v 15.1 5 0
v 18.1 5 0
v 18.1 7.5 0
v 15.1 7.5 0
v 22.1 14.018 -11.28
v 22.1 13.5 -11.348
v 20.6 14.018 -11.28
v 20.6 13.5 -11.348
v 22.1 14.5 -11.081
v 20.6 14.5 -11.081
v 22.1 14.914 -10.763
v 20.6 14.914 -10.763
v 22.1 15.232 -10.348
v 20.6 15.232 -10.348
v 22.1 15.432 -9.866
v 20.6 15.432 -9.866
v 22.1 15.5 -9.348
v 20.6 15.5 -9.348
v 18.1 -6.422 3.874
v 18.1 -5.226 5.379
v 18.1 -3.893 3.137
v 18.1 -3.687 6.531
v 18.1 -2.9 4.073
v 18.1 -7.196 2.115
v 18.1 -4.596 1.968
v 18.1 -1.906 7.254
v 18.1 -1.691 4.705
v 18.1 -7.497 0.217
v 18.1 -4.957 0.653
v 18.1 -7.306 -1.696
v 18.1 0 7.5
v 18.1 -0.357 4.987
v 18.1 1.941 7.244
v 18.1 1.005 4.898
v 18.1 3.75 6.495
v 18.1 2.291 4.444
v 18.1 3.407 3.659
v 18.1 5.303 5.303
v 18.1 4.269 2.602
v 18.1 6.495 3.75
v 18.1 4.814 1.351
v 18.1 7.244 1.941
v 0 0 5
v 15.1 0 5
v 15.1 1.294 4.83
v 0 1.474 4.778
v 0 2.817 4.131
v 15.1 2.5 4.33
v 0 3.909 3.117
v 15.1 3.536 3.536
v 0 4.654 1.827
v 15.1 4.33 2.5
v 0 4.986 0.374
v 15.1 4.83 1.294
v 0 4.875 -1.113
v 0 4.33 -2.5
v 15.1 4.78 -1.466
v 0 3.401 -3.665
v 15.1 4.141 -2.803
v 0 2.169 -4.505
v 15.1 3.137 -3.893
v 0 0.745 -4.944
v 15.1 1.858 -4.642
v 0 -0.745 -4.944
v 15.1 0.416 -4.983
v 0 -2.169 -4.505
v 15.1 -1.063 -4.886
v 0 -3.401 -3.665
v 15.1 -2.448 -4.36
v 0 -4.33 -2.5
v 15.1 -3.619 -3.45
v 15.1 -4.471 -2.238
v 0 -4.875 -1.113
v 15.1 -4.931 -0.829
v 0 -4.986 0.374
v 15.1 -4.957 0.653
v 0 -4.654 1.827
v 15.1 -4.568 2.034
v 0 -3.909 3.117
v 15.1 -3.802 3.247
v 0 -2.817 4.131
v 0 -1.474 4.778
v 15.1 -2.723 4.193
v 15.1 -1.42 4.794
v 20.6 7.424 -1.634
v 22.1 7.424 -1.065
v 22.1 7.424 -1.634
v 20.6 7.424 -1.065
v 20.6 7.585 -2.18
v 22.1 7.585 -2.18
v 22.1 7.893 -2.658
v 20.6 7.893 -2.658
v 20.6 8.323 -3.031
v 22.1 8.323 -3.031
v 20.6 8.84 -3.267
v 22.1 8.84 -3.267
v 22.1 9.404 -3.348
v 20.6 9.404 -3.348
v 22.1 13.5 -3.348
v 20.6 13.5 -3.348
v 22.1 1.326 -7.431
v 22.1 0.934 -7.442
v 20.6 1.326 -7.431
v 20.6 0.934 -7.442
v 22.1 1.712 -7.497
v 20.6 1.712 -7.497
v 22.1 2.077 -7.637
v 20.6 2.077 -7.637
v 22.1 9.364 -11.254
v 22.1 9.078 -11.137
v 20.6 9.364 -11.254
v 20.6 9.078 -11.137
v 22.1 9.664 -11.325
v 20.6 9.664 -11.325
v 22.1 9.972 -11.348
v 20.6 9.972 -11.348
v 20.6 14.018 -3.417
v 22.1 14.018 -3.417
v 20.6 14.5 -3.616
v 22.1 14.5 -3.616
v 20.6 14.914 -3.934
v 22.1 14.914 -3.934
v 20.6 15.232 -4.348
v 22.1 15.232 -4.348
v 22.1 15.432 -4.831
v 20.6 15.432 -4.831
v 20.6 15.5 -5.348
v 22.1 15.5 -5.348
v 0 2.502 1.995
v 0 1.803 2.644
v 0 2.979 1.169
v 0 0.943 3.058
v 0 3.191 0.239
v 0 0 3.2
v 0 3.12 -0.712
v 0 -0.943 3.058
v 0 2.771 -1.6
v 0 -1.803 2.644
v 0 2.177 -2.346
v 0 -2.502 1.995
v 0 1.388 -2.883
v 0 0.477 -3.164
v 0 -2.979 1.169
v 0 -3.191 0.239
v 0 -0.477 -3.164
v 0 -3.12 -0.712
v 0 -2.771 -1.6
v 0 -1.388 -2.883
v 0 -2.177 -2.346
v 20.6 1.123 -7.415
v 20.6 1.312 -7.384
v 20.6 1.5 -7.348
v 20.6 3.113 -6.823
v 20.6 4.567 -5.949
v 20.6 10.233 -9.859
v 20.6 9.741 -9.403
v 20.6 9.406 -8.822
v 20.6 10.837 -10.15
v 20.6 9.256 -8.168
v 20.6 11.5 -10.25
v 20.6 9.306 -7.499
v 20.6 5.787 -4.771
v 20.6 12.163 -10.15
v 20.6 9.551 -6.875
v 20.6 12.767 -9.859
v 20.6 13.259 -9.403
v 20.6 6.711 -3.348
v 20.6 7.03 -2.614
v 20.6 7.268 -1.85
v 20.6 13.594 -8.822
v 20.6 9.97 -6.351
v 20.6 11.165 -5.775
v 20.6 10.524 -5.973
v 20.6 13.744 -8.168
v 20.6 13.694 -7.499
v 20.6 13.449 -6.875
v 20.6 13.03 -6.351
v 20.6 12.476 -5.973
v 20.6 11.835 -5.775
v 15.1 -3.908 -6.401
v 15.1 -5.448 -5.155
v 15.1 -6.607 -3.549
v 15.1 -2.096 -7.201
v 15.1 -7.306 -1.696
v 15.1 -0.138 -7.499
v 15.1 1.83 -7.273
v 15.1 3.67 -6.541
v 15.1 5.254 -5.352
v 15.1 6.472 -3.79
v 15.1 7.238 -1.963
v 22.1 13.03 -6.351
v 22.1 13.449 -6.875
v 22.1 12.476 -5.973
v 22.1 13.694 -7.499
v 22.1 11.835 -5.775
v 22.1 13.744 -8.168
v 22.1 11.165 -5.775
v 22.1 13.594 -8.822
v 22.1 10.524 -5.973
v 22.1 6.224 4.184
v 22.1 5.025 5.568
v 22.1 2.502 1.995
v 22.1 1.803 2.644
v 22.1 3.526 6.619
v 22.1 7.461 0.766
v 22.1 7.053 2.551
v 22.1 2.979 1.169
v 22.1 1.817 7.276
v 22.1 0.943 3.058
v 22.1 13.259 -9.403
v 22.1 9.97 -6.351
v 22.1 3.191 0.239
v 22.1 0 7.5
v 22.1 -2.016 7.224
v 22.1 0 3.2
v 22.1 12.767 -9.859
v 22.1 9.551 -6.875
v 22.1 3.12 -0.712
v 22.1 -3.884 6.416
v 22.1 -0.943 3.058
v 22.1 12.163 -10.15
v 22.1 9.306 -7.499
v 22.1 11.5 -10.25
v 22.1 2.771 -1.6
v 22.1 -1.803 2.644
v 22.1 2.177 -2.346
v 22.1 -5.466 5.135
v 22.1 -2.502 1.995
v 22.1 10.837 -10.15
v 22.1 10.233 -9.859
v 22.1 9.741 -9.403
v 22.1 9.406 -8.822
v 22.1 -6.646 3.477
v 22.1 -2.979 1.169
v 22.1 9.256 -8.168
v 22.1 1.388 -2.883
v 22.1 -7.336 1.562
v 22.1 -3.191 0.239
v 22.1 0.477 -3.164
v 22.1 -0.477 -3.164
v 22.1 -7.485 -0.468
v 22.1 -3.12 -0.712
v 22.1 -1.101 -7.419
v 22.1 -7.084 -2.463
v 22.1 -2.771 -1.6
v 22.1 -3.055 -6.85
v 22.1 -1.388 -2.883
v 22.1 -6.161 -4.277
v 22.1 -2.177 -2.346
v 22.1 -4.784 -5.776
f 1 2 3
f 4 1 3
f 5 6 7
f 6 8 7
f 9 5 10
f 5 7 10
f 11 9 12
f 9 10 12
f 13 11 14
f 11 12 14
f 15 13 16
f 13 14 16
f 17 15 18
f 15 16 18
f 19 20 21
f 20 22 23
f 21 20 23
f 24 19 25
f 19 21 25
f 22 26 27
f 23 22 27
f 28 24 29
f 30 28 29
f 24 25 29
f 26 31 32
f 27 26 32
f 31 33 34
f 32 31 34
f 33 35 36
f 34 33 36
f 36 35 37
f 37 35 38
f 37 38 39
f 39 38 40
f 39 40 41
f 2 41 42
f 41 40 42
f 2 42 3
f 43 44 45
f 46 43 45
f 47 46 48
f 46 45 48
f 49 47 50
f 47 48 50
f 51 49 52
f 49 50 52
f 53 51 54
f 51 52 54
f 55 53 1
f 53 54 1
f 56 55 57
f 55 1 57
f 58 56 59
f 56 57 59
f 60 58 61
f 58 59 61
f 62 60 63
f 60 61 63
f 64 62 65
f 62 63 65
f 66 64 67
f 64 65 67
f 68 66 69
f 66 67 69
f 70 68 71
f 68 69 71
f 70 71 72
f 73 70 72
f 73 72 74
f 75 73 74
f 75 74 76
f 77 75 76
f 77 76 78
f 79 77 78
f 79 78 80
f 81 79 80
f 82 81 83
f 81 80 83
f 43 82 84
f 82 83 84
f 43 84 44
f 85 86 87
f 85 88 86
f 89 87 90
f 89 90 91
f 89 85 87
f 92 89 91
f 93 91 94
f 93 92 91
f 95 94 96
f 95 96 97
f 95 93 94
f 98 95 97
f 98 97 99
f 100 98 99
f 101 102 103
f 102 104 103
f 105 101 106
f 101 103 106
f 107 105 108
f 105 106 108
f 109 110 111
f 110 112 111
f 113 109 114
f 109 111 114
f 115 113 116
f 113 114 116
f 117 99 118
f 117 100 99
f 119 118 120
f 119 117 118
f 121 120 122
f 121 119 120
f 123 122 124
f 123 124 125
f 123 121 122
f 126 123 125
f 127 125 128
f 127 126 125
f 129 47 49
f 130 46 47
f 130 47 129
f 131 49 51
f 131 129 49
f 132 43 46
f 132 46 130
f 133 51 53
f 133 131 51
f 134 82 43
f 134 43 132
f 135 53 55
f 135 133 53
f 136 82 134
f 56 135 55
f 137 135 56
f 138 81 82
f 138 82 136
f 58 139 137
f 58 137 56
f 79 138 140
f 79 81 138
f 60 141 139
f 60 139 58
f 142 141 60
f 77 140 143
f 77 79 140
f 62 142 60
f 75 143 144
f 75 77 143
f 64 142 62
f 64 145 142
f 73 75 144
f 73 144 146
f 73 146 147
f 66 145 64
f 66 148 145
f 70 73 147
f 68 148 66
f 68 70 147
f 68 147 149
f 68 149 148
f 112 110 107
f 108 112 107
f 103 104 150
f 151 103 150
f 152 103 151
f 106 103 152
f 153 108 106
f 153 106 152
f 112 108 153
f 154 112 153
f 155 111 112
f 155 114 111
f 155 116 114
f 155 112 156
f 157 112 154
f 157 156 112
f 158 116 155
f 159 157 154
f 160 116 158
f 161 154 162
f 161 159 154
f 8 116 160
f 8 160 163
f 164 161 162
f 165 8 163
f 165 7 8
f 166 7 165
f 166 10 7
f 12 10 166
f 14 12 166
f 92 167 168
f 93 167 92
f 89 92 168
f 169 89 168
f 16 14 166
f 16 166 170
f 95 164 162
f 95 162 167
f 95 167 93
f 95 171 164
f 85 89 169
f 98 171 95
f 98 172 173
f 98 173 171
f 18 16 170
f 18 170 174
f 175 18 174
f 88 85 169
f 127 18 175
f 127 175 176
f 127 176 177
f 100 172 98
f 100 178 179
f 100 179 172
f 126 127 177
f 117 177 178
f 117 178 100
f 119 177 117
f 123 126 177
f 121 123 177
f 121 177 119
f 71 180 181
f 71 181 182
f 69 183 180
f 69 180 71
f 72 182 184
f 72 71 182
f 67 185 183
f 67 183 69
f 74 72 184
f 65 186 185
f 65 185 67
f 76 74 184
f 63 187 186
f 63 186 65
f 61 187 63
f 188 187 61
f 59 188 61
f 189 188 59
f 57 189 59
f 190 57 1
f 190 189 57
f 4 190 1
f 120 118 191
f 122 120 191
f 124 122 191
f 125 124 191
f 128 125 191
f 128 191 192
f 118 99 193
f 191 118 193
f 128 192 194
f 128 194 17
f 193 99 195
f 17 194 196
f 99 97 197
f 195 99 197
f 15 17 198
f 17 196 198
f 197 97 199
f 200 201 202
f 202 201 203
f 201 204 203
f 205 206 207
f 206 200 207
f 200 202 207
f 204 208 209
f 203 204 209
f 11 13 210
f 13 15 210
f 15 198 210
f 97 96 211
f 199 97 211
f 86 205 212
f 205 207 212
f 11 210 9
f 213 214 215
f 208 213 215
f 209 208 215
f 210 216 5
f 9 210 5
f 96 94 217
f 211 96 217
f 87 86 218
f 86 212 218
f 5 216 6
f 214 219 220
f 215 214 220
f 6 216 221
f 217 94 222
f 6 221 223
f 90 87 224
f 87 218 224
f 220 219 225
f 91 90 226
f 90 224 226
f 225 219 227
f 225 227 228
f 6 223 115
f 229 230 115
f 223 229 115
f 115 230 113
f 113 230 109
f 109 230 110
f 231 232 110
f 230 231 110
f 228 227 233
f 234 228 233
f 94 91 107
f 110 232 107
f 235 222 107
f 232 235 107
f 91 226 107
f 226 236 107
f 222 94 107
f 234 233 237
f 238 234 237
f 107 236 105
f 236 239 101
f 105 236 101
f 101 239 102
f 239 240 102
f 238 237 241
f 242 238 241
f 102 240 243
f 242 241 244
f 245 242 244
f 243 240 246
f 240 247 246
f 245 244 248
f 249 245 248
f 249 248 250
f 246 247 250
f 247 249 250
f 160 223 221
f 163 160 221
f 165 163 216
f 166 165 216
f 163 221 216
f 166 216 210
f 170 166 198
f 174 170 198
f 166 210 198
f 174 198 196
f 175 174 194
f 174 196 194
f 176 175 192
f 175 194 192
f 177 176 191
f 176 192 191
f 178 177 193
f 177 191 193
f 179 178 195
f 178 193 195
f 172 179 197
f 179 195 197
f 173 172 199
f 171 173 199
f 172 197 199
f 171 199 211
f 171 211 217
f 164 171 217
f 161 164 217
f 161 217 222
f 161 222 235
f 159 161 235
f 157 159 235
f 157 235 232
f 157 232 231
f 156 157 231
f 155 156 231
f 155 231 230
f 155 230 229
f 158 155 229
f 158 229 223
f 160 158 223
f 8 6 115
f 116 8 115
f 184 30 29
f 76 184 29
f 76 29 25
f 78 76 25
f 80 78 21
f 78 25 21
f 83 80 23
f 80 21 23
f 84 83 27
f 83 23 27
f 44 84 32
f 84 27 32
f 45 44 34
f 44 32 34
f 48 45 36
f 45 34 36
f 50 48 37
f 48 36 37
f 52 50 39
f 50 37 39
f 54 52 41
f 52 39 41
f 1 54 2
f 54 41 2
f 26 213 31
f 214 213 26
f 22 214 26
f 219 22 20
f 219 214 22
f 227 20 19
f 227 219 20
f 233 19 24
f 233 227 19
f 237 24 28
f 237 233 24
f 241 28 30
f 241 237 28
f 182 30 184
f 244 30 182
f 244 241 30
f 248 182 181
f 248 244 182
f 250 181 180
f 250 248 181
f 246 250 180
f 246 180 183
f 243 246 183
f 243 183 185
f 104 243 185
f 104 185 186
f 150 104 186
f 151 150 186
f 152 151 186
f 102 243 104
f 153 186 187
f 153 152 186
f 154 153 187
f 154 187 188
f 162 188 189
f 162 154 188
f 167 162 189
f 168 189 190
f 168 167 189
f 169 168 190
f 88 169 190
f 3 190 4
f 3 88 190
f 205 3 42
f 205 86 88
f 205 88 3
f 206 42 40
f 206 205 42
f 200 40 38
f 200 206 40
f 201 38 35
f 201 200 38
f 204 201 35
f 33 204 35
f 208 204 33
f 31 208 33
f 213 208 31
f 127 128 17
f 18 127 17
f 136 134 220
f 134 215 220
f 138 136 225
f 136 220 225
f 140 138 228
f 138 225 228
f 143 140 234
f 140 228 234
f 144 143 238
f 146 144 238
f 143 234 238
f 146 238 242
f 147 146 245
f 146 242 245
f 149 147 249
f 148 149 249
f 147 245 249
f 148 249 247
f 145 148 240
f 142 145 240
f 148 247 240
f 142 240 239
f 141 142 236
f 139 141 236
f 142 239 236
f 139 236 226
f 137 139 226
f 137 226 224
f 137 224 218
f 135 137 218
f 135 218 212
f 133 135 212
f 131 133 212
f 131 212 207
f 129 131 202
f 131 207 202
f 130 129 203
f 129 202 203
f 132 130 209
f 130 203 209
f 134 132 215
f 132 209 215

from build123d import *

# Parameters (mm, degrees)
SKIZZE1_W                       = 22.1
SKIZZE1_H                       = 4.3
SCHNITT_LINEAR_START            = -15.1
SKIZZE2_R                       = 7.5
SKIZZE2_R_2                     = 5
SCHNITT_LINEAR_AUSTRAGEN2_DEPTH = 15.1
SCHNITT_LINEAR_START_2          = -3
SCHNITT_LINEAR_AUSTRAGEN4_DEPTH = 3
AUFSATZ_LINEAR_AUSTRAGEN1_DEPTH = 1.5
DURCHGANGSLOCH_F_R_M41_D        = 4.5
VERRUNDUNG3_R                   = 2


with BuildPart() as part:
    # Skizze1 → Rotation1 (revolve)
    with BuildSketch(Plane.XY, mode=Mode.PRIVATE) as rotation1_sk:
        with Locations((11.05, 5.35)):
            Rectangle(SKIZZE1_W, SKIZZE1_H)
    revolve(rotation1_sk.sketch.rotate(Axis((0, 0, 0), (1, 0, 0)), 90), axis=Axis((0, 0, 0), (1, 0, 0)))

    # Skizze2 → Schnitt-Linear austragen2 (cut)
    with BuildSketch(Plane.ZY.offset(SCHNITT_LINEAR_START)):
        Circle(SKIZZE2_R)
        Circle(SKIZZE2_R_2, mode=Mode.SUBTRACT)
    extrude(amount=SCHNITT_LINEAR_AUSTRAGEN2_DEPTH, mode=Mode.SUBTRACT)

    # Skizze3 → Schnitt-Linear austragen4 (cut)
    with BuildSketch(Plane.ZY.offset(-15.1).offset(SCHNITT_LINEAR_START_2)):
        with BuildLine():
            Line((0, 5), (0, 7.5))
            ThreePointArc((0, 7.5), (7.451278665, -0.853490626), (-1.695892399, -7.305747667))
            Line((-1.695892399, -7.305747667), (0.652630961, -4.957224307))
            ThreePointArc((0.652630961, -4.957224307), (4.989294616, 0.327015646), (0, 5))
        make_face()
    extrude(amount=SCHNITT_LINEAR_AUSTRAGEN4_DEPTH, mode=Mode.SUBTRACT)

    # Skizze4 → Aufsatz-Linear austragen1 (add)
    with BuildSketch(Plane(origin=(22.1, 0, 0), x_dir=(0, 0, -1), z_dir=(1, 0, 0))):
        with BuildLine():
            Line((3.348469228, 6.711017347), (3.348469228, 15.5))
            Line((3.348469228, 15.5), (11.348469228, 15.5))
            Line((11.348469228, 15.5), (11.348469228, 9.5))
            Line((11.348469228, 9.5), (7.348469228, 1.5))
            ThreePointArc((7.348469228, 1.5), (5.949352783, 4.566749552), (3.348469228, 6.711017347))
        make_face()
    extrude(amount=-AUFSATZ_LINEAR_AUSTRAGEN1_DEPTH)

    # Durchgangsloch für M41 (through all)
    with Locations(Plane.ZY.offset(-18.1)):
        with Locations((-8, 11.5)):
            Hole(DURCHGANGSLOCH_F_R_M41_D / 2)

    # Verrundung3
    verrundung3_edges = [part.edges().sort_by_distance(p)[0] for p in [
        (21.35, 1.5, -7.348469228),
        (21.35, 6.711017347, -3.348469228),
        (21.35, 15.5, -3.348469228),
        (21.35, 15.5, -11.348469228),
        (21.35, 9.5, -11.348469228),
    ]]
    fillet(verrundung3_edges, radius=VERRUNDUNG3_R)


solid = part.part
